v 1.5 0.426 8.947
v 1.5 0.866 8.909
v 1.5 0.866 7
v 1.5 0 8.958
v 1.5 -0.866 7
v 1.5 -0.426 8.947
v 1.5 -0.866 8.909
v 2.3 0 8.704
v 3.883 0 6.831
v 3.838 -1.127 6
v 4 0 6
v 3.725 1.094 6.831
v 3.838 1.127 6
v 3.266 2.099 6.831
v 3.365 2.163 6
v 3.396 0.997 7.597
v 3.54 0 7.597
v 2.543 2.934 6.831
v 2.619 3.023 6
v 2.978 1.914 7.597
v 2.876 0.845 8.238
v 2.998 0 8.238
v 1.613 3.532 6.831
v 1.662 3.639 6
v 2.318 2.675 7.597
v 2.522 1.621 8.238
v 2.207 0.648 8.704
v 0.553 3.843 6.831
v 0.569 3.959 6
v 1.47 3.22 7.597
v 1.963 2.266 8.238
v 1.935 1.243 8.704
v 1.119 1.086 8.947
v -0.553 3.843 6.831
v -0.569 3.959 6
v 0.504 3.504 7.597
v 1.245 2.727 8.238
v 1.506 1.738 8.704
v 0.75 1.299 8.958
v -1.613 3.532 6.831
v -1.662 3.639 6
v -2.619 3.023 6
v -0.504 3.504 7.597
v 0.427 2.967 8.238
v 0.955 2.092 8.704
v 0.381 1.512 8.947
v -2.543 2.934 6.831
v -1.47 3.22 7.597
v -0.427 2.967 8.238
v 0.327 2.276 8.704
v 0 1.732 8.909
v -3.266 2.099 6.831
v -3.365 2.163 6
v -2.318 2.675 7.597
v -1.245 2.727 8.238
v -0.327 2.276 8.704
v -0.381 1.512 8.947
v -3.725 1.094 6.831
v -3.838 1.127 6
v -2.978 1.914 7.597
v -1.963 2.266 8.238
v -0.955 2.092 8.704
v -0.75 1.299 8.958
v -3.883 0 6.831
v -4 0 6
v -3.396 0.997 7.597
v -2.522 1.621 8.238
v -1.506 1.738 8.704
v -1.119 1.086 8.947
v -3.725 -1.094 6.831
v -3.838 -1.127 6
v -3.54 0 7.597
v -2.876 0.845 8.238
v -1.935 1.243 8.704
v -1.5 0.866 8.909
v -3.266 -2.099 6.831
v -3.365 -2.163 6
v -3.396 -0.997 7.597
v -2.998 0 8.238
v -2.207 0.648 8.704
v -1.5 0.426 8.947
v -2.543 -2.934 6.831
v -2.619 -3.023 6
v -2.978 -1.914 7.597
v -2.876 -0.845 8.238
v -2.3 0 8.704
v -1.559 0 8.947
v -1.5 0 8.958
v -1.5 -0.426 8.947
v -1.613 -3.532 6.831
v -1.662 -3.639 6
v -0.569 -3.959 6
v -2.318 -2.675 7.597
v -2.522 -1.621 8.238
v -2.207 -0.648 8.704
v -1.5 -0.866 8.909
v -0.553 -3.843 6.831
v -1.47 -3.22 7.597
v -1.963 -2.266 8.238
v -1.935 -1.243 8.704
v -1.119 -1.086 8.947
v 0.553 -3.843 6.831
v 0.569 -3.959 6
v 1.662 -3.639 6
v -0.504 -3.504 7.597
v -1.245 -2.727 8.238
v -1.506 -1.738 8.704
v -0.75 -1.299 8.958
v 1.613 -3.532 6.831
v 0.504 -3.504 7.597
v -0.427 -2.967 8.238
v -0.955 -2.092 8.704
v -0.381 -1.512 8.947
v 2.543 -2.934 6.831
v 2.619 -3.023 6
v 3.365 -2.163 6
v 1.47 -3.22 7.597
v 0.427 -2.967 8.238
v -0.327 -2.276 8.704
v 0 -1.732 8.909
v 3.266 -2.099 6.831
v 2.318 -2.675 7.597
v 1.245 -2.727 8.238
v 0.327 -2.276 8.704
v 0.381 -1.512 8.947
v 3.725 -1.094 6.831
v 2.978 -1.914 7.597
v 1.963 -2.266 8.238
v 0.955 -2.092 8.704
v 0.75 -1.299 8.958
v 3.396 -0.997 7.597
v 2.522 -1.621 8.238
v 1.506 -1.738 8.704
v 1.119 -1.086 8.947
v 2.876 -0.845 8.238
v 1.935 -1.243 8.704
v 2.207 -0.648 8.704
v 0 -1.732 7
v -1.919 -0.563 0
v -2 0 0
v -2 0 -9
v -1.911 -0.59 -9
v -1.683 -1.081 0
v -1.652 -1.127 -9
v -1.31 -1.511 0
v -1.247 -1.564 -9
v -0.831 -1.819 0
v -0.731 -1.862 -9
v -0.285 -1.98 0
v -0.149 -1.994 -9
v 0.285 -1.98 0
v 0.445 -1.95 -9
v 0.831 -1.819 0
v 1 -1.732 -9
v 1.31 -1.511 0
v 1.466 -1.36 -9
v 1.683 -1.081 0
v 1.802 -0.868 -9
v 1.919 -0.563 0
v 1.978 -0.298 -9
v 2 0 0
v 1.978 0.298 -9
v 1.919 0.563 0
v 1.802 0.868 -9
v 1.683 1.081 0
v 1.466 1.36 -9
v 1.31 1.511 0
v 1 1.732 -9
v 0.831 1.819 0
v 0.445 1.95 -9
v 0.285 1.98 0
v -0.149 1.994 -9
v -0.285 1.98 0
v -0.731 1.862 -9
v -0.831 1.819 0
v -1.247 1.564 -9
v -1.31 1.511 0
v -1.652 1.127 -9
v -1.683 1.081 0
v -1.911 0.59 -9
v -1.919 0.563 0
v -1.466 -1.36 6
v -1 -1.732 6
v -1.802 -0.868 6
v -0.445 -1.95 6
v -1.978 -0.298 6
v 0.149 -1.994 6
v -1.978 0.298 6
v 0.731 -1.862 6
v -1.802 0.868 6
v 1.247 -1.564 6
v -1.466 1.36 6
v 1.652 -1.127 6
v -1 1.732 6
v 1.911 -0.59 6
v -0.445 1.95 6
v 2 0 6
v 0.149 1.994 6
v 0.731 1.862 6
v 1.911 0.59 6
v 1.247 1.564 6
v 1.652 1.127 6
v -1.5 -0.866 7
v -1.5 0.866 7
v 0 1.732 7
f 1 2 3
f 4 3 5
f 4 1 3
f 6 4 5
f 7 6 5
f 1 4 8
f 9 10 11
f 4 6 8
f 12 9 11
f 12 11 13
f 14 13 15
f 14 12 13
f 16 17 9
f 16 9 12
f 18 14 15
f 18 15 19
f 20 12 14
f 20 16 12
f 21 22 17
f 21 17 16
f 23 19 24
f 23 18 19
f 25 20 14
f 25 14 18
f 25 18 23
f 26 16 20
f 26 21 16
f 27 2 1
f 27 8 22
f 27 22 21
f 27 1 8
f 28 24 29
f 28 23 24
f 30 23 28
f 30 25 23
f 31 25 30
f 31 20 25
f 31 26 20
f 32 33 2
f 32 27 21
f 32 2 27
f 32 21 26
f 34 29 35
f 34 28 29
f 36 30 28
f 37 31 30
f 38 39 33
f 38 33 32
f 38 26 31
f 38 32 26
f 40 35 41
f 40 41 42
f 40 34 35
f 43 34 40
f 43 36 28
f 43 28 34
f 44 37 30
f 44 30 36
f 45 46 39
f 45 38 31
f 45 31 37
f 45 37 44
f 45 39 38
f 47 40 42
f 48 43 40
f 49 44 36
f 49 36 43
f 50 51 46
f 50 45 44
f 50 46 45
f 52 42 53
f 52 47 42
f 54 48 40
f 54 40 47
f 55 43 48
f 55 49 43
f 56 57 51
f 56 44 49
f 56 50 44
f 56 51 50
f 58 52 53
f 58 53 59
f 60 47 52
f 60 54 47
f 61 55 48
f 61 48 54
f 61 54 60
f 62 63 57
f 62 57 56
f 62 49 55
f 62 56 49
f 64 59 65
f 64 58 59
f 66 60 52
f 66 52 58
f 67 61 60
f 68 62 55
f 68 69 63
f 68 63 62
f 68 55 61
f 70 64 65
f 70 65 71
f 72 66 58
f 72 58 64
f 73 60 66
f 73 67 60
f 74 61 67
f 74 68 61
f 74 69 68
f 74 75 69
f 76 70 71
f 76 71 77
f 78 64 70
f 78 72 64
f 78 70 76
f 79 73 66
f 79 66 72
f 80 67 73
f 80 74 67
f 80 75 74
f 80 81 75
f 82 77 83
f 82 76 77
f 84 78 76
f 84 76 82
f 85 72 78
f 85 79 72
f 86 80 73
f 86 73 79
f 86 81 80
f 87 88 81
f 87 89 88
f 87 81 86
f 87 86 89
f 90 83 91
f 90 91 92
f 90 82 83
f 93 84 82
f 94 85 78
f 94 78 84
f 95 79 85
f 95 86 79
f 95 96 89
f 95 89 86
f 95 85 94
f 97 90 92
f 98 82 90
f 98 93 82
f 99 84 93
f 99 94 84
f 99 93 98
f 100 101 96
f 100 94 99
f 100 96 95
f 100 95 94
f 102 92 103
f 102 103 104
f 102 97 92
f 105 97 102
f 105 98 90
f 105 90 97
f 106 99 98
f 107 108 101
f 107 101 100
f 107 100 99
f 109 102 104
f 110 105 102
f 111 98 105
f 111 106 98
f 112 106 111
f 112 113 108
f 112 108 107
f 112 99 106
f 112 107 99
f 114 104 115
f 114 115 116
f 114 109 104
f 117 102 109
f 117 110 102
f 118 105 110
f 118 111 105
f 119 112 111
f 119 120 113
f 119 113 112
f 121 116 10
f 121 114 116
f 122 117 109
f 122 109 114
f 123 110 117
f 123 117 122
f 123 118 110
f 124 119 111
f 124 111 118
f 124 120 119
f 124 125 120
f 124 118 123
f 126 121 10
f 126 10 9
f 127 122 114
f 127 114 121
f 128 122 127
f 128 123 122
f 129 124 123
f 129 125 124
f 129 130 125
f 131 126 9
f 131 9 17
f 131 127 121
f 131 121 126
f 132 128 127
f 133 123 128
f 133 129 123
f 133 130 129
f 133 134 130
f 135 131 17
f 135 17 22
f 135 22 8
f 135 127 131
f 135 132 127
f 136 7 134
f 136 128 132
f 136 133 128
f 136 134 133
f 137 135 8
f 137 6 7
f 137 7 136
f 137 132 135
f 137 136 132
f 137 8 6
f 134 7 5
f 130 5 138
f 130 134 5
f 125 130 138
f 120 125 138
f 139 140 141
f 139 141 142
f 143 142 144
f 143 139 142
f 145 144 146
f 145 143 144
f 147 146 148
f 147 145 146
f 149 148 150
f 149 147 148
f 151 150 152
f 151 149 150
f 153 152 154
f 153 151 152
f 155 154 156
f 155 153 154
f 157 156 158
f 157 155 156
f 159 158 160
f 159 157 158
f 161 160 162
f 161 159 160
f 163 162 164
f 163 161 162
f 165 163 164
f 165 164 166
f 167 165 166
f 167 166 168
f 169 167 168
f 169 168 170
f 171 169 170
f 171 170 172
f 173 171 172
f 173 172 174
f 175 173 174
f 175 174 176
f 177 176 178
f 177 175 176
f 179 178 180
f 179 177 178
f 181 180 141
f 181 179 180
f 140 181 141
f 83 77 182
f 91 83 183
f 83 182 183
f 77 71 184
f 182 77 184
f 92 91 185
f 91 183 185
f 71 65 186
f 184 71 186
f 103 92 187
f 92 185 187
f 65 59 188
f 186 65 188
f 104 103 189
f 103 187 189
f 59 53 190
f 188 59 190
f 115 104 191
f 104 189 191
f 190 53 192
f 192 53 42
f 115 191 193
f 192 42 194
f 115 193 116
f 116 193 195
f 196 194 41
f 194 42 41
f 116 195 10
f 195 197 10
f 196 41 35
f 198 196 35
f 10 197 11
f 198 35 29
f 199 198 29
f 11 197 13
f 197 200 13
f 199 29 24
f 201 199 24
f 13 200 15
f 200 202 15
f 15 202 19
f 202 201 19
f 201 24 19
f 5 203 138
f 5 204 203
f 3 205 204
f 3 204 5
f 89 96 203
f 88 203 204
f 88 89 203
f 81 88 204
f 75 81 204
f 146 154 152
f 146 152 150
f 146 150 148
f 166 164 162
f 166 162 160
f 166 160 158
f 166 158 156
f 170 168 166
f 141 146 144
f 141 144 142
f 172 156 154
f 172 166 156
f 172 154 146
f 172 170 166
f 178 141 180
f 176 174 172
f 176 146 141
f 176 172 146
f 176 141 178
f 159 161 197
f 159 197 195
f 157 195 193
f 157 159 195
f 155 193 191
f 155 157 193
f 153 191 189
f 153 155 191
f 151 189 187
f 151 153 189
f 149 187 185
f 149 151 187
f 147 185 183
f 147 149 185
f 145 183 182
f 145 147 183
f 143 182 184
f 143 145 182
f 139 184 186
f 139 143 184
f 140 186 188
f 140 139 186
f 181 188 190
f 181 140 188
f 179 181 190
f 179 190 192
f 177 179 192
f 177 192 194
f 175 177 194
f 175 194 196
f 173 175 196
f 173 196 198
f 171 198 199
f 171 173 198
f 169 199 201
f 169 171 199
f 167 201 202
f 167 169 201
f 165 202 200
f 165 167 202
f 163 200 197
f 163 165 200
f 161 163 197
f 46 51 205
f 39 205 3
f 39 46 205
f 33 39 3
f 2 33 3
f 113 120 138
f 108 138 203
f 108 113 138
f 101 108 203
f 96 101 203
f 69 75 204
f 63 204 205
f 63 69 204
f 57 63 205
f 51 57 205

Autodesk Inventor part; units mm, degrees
ref_plane "YZ Plane" through (0, 0, 0) normal (1, 0, 0) x (0, 1, 0)
ref_plane "XZ Plane" through (0, 0, 0) normal (0, 1, 0) x (-1, 0, 0)
ref_plane "XY Plane" through (0, 0, 0) normal (0, 0, 1) x (1, 0, 0)
sketch "スケッチ1" plane through (0, 0, 0) normal (0, 0, 1) x (1, 0, 0)
  circle A0 centre (0, 0) radius 2
  dimension "d0" = 4
extrude "押し出し1" add sketch "スケッチ1" along normal blind 6
sketch "スケッチ2" plane through (0, 0, 6) normal (0, 0, 1) x (1, 0, 0)
  circle A0 centre (0, 0) radius 2 projected
  circle A1 centre (0, 0) radius 4
  dimension "d3" = 8
extrude "押し出し2" add sketch "スケッチ2" along normal blind 3 contours A0 | A1
fillet "フィレット1" radius 3 1 edges at (-4, 0, 9)
thread "ねじ1" size "M4x0.7" class "6g" standard "ANSI Metric M Profile" full length
sketch "スケッチ3" plane through (0, 0, 0) normal (0, 0, -1) x (-1, 0, 0)
  circle A0 centre (0, 0) radius 2
extrude "押し出し3" add sketch "スケッチ3" along normal blind 9
sketch "スケッチ4" plane through (0, 0, 9) normal (0, 0, 1) x (1, 0, 0)
  line L0 (-1.5, 0.866) -> (0, 1.7321)
  line L1 (0, 1.7321) -> (1.5, 0.866)
  line L2 (1.5, 0.866) -> (1.5, -0.866)
  line L3 (1.5, -0.866) -> (0, -1.7321)
  line L4 (0, -1.7321) -> (-1.5, -0.866)
  line L5 (-1.5, -0.866) -> (-1.5, 0.866)
  point P0 (0, 0)
  point P1 (0, 0)
  point P2 (-1.5, 0)
  dimension "d11" = 3
extrude "押し出し4" cut sketch "スケッチ4" against normal blind 2
properties part number "SB　M4 15mm なべネジ (1)" material "Stainless Steel, 440C"
